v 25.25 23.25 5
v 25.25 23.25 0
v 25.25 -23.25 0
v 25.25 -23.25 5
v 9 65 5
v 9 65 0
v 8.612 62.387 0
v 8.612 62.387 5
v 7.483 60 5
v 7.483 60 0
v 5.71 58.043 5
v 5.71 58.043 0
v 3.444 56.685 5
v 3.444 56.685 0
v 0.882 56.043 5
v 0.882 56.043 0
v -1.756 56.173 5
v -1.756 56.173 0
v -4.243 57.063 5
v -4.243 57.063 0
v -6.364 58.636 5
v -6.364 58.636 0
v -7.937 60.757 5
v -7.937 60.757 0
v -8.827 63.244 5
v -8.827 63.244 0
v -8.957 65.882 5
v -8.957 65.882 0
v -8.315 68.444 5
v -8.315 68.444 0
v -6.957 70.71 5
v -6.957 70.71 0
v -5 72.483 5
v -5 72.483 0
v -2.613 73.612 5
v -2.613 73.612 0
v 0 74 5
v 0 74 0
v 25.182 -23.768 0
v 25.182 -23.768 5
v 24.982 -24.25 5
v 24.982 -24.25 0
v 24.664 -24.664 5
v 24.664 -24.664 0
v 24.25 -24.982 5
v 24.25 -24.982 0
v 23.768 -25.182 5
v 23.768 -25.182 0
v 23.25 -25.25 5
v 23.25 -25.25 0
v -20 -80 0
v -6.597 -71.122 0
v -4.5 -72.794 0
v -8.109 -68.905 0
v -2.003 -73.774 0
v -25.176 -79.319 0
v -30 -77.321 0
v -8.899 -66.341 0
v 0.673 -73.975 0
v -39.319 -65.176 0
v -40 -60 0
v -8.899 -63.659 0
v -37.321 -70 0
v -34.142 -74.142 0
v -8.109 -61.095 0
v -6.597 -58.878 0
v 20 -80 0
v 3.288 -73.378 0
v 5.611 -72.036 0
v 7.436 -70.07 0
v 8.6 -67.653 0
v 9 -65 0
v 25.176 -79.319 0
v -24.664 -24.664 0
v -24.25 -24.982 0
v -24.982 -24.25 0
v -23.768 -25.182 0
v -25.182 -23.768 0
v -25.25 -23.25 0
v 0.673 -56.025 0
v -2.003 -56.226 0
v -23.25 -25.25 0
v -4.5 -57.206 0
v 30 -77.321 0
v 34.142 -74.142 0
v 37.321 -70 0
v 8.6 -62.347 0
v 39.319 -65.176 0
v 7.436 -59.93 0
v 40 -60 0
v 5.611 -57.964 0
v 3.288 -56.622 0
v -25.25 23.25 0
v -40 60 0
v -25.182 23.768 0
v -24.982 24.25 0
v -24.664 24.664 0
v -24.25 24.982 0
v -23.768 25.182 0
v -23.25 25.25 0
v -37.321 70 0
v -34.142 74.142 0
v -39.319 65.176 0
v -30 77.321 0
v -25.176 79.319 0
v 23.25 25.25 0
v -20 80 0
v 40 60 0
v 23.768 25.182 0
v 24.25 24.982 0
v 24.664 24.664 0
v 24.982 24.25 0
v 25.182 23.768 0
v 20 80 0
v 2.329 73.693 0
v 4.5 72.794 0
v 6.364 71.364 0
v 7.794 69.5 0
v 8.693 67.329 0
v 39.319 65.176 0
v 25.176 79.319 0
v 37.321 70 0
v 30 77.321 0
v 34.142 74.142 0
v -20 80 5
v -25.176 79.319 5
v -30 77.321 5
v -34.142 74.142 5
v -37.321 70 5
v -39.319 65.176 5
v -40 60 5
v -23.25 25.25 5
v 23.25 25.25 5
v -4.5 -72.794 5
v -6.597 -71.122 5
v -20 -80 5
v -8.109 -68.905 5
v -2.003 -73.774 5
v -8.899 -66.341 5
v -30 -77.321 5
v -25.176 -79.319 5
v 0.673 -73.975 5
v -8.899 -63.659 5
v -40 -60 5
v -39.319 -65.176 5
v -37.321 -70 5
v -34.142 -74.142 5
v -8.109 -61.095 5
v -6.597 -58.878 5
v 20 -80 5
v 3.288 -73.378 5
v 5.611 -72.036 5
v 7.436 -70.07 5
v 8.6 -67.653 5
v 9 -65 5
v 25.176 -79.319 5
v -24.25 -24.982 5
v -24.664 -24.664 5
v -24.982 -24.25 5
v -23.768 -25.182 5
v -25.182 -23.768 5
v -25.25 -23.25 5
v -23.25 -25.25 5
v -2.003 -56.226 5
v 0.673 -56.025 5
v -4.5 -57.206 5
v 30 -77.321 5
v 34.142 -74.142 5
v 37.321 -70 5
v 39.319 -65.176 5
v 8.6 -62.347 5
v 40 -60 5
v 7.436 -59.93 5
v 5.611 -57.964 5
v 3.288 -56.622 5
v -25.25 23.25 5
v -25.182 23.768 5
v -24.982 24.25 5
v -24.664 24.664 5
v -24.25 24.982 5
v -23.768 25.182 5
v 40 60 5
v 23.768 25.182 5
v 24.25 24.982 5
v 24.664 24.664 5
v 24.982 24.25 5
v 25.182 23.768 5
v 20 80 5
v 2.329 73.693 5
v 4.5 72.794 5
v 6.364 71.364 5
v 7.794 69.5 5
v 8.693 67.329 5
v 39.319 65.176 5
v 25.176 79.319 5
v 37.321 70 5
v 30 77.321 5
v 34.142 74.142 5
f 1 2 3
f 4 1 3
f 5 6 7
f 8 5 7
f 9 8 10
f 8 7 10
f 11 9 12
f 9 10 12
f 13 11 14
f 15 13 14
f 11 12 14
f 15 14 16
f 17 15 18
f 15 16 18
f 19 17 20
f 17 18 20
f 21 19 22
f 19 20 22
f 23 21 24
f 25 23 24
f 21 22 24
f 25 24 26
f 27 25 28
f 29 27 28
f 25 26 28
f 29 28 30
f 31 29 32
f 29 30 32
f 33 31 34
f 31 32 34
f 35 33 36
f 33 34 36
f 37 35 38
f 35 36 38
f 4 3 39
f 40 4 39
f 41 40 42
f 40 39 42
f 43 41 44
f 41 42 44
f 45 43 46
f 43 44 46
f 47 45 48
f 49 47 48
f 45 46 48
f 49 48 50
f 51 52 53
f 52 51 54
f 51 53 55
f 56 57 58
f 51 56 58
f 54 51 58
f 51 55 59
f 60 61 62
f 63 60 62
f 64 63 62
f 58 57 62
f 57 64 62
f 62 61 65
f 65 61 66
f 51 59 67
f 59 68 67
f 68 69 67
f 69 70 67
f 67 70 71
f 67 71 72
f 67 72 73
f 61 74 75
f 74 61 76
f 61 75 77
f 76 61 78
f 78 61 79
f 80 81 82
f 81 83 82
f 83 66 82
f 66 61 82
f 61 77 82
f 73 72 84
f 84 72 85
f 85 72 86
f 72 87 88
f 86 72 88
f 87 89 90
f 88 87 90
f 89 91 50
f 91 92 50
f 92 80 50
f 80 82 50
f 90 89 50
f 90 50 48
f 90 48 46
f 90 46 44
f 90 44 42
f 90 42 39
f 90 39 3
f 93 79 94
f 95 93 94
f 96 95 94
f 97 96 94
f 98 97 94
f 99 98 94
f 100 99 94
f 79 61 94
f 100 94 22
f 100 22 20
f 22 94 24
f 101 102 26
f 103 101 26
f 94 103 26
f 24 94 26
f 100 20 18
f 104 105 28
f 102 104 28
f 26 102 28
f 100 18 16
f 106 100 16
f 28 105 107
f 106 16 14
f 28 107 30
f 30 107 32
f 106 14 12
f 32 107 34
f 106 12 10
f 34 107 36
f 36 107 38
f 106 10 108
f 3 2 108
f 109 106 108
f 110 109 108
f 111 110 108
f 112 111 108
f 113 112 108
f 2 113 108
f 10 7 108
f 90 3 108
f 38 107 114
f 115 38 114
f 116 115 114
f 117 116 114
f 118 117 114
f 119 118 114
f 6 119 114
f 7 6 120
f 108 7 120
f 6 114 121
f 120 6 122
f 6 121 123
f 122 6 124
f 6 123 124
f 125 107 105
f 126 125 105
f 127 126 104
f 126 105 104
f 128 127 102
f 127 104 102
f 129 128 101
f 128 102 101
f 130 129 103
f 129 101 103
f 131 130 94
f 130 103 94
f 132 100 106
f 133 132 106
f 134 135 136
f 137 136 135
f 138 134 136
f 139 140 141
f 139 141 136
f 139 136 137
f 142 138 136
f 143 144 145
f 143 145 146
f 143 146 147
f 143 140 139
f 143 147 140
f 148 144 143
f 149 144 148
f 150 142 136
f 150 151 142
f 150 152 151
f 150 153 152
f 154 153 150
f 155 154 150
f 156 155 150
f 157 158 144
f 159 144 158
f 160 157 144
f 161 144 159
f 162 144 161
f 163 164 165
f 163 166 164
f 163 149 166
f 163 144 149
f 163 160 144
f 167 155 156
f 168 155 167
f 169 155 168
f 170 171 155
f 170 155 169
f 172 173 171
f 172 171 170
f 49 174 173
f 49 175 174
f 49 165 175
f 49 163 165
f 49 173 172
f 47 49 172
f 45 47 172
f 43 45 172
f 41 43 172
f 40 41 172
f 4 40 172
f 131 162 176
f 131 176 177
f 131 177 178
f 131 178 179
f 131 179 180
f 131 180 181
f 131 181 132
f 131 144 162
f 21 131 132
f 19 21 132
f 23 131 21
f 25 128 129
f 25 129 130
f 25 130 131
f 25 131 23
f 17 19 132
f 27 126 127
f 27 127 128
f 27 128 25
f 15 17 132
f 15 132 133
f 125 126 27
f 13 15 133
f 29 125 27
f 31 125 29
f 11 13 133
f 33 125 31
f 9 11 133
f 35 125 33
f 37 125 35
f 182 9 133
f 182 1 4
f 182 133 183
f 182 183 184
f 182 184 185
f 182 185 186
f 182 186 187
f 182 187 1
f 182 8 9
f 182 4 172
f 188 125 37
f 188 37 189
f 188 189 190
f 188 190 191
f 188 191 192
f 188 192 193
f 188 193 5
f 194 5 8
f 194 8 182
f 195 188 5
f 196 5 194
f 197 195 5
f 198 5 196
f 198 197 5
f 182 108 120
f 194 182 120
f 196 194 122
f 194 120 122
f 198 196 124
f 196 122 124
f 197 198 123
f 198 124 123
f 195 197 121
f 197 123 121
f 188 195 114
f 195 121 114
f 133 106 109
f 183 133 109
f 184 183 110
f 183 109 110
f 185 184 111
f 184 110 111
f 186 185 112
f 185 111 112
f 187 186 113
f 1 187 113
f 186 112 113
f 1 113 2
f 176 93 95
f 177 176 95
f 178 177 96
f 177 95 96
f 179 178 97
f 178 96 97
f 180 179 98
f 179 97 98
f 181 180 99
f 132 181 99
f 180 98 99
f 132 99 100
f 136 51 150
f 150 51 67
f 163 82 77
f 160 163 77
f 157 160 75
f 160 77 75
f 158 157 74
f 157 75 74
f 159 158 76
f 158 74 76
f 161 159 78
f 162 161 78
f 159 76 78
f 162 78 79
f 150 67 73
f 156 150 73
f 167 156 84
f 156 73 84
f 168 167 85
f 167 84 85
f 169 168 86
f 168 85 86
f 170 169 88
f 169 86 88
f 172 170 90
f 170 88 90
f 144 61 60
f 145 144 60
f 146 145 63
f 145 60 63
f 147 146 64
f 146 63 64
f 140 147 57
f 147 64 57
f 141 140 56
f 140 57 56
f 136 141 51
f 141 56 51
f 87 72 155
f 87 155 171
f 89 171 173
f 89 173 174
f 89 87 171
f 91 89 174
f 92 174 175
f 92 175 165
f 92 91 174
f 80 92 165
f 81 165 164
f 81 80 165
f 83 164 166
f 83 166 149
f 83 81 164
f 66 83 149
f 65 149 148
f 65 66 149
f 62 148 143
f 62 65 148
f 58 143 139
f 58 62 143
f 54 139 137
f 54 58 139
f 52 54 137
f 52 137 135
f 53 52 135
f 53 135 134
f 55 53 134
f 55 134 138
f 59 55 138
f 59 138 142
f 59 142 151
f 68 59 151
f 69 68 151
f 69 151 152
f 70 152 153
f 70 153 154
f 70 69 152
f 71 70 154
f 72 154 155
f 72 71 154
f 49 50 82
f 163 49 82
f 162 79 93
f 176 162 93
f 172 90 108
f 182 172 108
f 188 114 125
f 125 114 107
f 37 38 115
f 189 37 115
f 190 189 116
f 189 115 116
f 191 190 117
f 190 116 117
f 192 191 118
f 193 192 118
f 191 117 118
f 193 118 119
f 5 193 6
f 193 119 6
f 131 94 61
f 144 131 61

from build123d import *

# Parameters (mm, degrees)
F0_R     = 9
F1_DEPTH = 5


with BuildPart() as f1:
    # F0 (on Top) → F1 (new body)
    with BuildSketch(Plane.XY):
        with BuildLine():
            Line((20, 80), (0, 80))
            Line((0, 80), (-20, 80))
            ThreePointArc((-20, 80), (-34.142136, 74.142136), (-40, 60))
            Line((-40, 60), (-40, -60))
            ThreePointArc((-40, -60), (-34.142136, -74.142136), (-20, -80))
            Line((-20, -80), (20, -80))
            ThreePointArc((20, -80), (34.142136, -74.142136), (40, -60))
            Line((40, -60), (40, 60))
            ThreePointArc((40, 60), (34.142136, 74.142136), (20, 80))
        make_face()
        with Locations((0, -65)):
            Circle(F0_R, mode=Mode.SUBTRACT)
        with BuildLine():
            ThreePointArc((25.25, -23.25), (24.664214, -24.664214), (23.25, -25.25))
            Line((23.25, -25.25), (-23.25, -25.25))
            ThreePointArc((-23.25, -25.25), (-24.664214, -24.664214), (-25.25, -23.25))
            Line((-25.25, -23.25), (-25.25, 23.25))
            ThreePointArc((-25.25, 23.25), (-24.664214, 24.664214), (-23.25, 25.25))
            Line((-23.25, 25.25), (23.25, 25.25))
            ThreePointArc((23.25, 25.25), (24.664214, 24.664214), (25.25, 23.25))
            Line((25.25, 23.25), (25.25, -23.25))
        make_face(mode=Mode.SUBTRACT)
        with BuildLine():
            ThreePointArc((9, 65), (-6.363961, 58.636039), (0, 74))
            ThreePointArc((0, 74), (6.363961, 71.363961), (9, 65))
        make_face(mode=Mode.SUBTRACT)
    extrude(amount=F1_DEPTH)


solid = f1.part
